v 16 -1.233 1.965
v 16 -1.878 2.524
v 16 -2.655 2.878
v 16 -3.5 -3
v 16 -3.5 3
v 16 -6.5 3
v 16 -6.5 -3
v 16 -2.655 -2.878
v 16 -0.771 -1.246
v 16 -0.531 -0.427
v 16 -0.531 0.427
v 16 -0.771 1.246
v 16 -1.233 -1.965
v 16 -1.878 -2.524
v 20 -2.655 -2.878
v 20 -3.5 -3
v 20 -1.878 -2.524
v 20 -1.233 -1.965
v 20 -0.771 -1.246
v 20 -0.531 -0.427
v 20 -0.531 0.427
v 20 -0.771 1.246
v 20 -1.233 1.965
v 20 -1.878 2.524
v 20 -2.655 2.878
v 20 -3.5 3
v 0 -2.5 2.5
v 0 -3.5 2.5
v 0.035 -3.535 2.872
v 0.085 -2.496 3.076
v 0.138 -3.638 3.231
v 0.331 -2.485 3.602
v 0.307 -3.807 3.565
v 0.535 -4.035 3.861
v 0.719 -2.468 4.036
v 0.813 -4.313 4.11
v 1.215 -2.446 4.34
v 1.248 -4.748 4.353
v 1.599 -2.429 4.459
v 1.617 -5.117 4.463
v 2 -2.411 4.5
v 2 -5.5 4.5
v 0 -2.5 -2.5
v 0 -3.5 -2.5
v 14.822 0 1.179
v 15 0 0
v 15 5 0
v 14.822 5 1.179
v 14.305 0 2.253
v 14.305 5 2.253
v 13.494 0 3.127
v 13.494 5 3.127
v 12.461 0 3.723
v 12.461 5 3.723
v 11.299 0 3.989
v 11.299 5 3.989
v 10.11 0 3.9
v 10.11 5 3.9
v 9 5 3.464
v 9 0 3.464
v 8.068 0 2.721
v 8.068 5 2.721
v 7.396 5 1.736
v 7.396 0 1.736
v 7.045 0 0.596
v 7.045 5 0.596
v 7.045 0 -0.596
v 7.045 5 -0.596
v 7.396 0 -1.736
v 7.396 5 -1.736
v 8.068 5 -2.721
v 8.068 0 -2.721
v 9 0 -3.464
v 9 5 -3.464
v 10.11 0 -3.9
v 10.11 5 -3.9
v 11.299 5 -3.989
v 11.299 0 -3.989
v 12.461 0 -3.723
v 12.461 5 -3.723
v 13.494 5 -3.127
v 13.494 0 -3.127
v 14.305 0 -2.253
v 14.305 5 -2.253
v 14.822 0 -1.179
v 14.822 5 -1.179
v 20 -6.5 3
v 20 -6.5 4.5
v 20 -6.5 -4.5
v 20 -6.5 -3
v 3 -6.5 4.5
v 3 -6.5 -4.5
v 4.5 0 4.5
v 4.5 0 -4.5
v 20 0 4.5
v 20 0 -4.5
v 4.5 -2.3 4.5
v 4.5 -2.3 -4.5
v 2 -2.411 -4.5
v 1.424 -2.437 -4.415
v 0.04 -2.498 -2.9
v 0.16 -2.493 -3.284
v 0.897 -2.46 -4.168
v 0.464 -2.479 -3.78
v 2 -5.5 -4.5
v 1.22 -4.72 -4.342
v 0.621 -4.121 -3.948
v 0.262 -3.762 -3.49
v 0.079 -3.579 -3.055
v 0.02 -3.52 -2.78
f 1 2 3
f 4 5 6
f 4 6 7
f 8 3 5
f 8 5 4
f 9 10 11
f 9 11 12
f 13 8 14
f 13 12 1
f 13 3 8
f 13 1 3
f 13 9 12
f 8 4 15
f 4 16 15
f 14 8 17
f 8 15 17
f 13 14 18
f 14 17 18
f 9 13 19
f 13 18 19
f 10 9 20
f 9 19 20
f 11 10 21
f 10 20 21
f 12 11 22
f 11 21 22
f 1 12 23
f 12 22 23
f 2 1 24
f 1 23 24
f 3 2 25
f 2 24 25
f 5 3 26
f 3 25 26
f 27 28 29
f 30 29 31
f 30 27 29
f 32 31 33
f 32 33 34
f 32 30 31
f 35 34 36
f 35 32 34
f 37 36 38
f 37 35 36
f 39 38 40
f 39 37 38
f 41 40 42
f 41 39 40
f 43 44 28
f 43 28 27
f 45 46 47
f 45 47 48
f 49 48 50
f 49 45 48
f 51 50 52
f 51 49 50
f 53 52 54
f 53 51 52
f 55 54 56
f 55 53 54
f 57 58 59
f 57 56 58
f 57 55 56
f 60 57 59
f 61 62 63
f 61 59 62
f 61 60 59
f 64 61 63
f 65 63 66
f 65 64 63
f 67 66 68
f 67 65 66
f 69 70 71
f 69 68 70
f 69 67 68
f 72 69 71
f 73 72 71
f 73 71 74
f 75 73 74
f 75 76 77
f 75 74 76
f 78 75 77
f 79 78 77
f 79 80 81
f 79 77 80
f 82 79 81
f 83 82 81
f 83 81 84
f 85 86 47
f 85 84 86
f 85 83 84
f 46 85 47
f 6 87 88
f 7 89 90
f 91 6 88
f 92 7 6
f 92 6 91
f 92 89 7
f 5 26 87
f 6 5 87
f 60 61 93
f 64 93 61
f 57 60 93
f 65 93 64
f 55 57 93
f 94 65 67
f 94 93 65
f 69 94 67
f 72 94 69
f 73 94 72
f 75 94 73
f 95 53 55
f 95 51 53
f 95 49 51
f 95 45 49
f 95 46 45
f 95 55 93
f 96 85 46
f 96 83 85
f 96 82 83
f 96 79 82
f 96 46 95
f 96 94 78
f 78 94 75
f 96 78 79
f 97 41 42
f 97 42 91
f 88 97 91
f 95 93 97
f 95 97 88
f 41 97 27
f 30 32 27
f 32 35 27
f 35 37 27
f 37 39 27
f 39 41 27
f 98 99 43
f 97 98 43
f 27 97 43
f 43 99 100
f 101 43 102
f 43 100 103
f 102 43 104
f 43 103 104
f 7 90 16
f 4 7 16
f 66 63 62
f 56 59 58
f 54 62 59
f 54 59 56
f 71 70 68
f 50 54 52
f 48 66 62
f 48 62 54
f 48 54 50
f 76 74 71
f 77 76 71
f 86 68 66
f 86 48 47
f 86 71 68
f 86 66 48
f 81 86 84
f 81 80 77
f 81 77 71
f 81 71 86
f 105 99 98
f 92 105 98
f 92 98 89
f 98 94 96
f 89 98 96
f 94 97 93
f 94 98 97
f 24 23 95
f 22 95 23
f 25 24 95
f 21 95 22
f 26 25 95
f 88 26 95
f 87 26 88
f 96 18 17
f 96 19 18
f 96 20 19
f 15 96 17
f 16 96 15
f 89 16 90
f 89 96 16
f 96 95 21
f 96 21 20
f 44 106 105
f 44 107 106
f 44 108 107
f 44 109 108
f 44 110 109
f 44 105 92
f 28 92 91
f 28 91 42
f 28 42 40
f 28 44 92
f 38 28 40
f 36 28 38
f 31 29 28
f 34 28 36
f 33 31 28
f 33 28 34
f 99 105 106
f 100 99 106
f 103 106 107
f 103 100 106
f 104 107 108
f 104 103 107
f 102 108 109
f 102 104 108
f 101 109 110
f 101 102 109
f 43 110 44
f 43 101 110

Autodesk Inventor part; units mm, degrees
ref_plane "YZ Plane" through (0, 0, 0) normal (1, 0, 0) x (0, 1, 0)
ref_plane "XZ Plane" through (0, 0, 0) normal (0, 1, 0) x (-1, 0, 0)
ref_plane "XY Plane" through (0, 0, 0) normal (0, 0, 1) x (1, 0, 0)
sketch "Skizze21" plane through (0, 0, 0) normal (0, 0, 1) x (1, 0, 0)
  line L0 (0, 0) -> (20, 0)
  line L1 (20, 0) -> (20, -6.5)
  line L2 (20, -6.5) -> (0, -6.5)
  line L3 (0, -6.5) -> (0, 0)
  dimension "d73" = 6.5
  dimension "d74" = 20
extrude "Extrusion16" add sketch "Skizze21" along normal mid plane 9
sketch "Skizze24" plane through (0, 0, 0) normal (0, 0, 1) x (1, 0, 0)
  line L0 (4.5, -2.3) -> (4.5, 0)
  line L1 (4.5, 0) -> (0, 0)
  line L2 (0, 0) -> (0, -2.5)
  line L3 (20, 0) -> (0, 0) projected
  line L4 (0, 0) -> (0, -6.5) projected
  line L5 (4.5, -2.3) -> (0, -2.5)
  dimension "d92" = 4.5
  dimension "d101" = 2.3
  dimension "d102" = 2.5
extrude "Extrusion19" cut sketch "Skizze24" along normal mid plane 16.5
sketch "Skizze23" plane through (0, 0, 4.5) normal (0, 1, 0) x (1, 0, 0)
  line L0 (0, 4.5) -> (36.014, 4.5) construction
  circle A0 centre (11, 4.5) radius 4
  line L1 (0, 0) -> (0, 9) projected
  line L2 (4.5, 9) -> (4.5, 0) projected
  dimension "d87" = 8
  dimension "d96" = 6.5
extrude "Extrusion18" add sketch "Skizze23" along normal blind 5
chamfer "Fasen2" distance 3 angle 45 1 edges at (0, -6.5, 0)
fillet "Rundung11" radius 2 2 edges at (0, -3, 4.5) (0, -3, -4.5)
sketch "Skizze25" plane through (20, -6.5, 4.5) normal (1, 0, 0) x (0, 0, -1)
  line L0 (9, 6.5) -> (0, 6.5) projected
  line L1 (9, 6.5) -> (9, 0) projected
  circle A0 centre (4.5, 3) radius 3
  line L2 (4.5, 6.5) -> (4.5, 0) construction
  line L3 (9, 0) -> (0, 0) projected
  line L4 (1.5, 3) -> (1.5, 0)
  line L5 (7.5, 0) -> (7.5, 3)
  dimension "d106" = 6
extrude "Extrusion20" cut sketch "Skizze25" against normal blind 4
properties part number "P_handle"
